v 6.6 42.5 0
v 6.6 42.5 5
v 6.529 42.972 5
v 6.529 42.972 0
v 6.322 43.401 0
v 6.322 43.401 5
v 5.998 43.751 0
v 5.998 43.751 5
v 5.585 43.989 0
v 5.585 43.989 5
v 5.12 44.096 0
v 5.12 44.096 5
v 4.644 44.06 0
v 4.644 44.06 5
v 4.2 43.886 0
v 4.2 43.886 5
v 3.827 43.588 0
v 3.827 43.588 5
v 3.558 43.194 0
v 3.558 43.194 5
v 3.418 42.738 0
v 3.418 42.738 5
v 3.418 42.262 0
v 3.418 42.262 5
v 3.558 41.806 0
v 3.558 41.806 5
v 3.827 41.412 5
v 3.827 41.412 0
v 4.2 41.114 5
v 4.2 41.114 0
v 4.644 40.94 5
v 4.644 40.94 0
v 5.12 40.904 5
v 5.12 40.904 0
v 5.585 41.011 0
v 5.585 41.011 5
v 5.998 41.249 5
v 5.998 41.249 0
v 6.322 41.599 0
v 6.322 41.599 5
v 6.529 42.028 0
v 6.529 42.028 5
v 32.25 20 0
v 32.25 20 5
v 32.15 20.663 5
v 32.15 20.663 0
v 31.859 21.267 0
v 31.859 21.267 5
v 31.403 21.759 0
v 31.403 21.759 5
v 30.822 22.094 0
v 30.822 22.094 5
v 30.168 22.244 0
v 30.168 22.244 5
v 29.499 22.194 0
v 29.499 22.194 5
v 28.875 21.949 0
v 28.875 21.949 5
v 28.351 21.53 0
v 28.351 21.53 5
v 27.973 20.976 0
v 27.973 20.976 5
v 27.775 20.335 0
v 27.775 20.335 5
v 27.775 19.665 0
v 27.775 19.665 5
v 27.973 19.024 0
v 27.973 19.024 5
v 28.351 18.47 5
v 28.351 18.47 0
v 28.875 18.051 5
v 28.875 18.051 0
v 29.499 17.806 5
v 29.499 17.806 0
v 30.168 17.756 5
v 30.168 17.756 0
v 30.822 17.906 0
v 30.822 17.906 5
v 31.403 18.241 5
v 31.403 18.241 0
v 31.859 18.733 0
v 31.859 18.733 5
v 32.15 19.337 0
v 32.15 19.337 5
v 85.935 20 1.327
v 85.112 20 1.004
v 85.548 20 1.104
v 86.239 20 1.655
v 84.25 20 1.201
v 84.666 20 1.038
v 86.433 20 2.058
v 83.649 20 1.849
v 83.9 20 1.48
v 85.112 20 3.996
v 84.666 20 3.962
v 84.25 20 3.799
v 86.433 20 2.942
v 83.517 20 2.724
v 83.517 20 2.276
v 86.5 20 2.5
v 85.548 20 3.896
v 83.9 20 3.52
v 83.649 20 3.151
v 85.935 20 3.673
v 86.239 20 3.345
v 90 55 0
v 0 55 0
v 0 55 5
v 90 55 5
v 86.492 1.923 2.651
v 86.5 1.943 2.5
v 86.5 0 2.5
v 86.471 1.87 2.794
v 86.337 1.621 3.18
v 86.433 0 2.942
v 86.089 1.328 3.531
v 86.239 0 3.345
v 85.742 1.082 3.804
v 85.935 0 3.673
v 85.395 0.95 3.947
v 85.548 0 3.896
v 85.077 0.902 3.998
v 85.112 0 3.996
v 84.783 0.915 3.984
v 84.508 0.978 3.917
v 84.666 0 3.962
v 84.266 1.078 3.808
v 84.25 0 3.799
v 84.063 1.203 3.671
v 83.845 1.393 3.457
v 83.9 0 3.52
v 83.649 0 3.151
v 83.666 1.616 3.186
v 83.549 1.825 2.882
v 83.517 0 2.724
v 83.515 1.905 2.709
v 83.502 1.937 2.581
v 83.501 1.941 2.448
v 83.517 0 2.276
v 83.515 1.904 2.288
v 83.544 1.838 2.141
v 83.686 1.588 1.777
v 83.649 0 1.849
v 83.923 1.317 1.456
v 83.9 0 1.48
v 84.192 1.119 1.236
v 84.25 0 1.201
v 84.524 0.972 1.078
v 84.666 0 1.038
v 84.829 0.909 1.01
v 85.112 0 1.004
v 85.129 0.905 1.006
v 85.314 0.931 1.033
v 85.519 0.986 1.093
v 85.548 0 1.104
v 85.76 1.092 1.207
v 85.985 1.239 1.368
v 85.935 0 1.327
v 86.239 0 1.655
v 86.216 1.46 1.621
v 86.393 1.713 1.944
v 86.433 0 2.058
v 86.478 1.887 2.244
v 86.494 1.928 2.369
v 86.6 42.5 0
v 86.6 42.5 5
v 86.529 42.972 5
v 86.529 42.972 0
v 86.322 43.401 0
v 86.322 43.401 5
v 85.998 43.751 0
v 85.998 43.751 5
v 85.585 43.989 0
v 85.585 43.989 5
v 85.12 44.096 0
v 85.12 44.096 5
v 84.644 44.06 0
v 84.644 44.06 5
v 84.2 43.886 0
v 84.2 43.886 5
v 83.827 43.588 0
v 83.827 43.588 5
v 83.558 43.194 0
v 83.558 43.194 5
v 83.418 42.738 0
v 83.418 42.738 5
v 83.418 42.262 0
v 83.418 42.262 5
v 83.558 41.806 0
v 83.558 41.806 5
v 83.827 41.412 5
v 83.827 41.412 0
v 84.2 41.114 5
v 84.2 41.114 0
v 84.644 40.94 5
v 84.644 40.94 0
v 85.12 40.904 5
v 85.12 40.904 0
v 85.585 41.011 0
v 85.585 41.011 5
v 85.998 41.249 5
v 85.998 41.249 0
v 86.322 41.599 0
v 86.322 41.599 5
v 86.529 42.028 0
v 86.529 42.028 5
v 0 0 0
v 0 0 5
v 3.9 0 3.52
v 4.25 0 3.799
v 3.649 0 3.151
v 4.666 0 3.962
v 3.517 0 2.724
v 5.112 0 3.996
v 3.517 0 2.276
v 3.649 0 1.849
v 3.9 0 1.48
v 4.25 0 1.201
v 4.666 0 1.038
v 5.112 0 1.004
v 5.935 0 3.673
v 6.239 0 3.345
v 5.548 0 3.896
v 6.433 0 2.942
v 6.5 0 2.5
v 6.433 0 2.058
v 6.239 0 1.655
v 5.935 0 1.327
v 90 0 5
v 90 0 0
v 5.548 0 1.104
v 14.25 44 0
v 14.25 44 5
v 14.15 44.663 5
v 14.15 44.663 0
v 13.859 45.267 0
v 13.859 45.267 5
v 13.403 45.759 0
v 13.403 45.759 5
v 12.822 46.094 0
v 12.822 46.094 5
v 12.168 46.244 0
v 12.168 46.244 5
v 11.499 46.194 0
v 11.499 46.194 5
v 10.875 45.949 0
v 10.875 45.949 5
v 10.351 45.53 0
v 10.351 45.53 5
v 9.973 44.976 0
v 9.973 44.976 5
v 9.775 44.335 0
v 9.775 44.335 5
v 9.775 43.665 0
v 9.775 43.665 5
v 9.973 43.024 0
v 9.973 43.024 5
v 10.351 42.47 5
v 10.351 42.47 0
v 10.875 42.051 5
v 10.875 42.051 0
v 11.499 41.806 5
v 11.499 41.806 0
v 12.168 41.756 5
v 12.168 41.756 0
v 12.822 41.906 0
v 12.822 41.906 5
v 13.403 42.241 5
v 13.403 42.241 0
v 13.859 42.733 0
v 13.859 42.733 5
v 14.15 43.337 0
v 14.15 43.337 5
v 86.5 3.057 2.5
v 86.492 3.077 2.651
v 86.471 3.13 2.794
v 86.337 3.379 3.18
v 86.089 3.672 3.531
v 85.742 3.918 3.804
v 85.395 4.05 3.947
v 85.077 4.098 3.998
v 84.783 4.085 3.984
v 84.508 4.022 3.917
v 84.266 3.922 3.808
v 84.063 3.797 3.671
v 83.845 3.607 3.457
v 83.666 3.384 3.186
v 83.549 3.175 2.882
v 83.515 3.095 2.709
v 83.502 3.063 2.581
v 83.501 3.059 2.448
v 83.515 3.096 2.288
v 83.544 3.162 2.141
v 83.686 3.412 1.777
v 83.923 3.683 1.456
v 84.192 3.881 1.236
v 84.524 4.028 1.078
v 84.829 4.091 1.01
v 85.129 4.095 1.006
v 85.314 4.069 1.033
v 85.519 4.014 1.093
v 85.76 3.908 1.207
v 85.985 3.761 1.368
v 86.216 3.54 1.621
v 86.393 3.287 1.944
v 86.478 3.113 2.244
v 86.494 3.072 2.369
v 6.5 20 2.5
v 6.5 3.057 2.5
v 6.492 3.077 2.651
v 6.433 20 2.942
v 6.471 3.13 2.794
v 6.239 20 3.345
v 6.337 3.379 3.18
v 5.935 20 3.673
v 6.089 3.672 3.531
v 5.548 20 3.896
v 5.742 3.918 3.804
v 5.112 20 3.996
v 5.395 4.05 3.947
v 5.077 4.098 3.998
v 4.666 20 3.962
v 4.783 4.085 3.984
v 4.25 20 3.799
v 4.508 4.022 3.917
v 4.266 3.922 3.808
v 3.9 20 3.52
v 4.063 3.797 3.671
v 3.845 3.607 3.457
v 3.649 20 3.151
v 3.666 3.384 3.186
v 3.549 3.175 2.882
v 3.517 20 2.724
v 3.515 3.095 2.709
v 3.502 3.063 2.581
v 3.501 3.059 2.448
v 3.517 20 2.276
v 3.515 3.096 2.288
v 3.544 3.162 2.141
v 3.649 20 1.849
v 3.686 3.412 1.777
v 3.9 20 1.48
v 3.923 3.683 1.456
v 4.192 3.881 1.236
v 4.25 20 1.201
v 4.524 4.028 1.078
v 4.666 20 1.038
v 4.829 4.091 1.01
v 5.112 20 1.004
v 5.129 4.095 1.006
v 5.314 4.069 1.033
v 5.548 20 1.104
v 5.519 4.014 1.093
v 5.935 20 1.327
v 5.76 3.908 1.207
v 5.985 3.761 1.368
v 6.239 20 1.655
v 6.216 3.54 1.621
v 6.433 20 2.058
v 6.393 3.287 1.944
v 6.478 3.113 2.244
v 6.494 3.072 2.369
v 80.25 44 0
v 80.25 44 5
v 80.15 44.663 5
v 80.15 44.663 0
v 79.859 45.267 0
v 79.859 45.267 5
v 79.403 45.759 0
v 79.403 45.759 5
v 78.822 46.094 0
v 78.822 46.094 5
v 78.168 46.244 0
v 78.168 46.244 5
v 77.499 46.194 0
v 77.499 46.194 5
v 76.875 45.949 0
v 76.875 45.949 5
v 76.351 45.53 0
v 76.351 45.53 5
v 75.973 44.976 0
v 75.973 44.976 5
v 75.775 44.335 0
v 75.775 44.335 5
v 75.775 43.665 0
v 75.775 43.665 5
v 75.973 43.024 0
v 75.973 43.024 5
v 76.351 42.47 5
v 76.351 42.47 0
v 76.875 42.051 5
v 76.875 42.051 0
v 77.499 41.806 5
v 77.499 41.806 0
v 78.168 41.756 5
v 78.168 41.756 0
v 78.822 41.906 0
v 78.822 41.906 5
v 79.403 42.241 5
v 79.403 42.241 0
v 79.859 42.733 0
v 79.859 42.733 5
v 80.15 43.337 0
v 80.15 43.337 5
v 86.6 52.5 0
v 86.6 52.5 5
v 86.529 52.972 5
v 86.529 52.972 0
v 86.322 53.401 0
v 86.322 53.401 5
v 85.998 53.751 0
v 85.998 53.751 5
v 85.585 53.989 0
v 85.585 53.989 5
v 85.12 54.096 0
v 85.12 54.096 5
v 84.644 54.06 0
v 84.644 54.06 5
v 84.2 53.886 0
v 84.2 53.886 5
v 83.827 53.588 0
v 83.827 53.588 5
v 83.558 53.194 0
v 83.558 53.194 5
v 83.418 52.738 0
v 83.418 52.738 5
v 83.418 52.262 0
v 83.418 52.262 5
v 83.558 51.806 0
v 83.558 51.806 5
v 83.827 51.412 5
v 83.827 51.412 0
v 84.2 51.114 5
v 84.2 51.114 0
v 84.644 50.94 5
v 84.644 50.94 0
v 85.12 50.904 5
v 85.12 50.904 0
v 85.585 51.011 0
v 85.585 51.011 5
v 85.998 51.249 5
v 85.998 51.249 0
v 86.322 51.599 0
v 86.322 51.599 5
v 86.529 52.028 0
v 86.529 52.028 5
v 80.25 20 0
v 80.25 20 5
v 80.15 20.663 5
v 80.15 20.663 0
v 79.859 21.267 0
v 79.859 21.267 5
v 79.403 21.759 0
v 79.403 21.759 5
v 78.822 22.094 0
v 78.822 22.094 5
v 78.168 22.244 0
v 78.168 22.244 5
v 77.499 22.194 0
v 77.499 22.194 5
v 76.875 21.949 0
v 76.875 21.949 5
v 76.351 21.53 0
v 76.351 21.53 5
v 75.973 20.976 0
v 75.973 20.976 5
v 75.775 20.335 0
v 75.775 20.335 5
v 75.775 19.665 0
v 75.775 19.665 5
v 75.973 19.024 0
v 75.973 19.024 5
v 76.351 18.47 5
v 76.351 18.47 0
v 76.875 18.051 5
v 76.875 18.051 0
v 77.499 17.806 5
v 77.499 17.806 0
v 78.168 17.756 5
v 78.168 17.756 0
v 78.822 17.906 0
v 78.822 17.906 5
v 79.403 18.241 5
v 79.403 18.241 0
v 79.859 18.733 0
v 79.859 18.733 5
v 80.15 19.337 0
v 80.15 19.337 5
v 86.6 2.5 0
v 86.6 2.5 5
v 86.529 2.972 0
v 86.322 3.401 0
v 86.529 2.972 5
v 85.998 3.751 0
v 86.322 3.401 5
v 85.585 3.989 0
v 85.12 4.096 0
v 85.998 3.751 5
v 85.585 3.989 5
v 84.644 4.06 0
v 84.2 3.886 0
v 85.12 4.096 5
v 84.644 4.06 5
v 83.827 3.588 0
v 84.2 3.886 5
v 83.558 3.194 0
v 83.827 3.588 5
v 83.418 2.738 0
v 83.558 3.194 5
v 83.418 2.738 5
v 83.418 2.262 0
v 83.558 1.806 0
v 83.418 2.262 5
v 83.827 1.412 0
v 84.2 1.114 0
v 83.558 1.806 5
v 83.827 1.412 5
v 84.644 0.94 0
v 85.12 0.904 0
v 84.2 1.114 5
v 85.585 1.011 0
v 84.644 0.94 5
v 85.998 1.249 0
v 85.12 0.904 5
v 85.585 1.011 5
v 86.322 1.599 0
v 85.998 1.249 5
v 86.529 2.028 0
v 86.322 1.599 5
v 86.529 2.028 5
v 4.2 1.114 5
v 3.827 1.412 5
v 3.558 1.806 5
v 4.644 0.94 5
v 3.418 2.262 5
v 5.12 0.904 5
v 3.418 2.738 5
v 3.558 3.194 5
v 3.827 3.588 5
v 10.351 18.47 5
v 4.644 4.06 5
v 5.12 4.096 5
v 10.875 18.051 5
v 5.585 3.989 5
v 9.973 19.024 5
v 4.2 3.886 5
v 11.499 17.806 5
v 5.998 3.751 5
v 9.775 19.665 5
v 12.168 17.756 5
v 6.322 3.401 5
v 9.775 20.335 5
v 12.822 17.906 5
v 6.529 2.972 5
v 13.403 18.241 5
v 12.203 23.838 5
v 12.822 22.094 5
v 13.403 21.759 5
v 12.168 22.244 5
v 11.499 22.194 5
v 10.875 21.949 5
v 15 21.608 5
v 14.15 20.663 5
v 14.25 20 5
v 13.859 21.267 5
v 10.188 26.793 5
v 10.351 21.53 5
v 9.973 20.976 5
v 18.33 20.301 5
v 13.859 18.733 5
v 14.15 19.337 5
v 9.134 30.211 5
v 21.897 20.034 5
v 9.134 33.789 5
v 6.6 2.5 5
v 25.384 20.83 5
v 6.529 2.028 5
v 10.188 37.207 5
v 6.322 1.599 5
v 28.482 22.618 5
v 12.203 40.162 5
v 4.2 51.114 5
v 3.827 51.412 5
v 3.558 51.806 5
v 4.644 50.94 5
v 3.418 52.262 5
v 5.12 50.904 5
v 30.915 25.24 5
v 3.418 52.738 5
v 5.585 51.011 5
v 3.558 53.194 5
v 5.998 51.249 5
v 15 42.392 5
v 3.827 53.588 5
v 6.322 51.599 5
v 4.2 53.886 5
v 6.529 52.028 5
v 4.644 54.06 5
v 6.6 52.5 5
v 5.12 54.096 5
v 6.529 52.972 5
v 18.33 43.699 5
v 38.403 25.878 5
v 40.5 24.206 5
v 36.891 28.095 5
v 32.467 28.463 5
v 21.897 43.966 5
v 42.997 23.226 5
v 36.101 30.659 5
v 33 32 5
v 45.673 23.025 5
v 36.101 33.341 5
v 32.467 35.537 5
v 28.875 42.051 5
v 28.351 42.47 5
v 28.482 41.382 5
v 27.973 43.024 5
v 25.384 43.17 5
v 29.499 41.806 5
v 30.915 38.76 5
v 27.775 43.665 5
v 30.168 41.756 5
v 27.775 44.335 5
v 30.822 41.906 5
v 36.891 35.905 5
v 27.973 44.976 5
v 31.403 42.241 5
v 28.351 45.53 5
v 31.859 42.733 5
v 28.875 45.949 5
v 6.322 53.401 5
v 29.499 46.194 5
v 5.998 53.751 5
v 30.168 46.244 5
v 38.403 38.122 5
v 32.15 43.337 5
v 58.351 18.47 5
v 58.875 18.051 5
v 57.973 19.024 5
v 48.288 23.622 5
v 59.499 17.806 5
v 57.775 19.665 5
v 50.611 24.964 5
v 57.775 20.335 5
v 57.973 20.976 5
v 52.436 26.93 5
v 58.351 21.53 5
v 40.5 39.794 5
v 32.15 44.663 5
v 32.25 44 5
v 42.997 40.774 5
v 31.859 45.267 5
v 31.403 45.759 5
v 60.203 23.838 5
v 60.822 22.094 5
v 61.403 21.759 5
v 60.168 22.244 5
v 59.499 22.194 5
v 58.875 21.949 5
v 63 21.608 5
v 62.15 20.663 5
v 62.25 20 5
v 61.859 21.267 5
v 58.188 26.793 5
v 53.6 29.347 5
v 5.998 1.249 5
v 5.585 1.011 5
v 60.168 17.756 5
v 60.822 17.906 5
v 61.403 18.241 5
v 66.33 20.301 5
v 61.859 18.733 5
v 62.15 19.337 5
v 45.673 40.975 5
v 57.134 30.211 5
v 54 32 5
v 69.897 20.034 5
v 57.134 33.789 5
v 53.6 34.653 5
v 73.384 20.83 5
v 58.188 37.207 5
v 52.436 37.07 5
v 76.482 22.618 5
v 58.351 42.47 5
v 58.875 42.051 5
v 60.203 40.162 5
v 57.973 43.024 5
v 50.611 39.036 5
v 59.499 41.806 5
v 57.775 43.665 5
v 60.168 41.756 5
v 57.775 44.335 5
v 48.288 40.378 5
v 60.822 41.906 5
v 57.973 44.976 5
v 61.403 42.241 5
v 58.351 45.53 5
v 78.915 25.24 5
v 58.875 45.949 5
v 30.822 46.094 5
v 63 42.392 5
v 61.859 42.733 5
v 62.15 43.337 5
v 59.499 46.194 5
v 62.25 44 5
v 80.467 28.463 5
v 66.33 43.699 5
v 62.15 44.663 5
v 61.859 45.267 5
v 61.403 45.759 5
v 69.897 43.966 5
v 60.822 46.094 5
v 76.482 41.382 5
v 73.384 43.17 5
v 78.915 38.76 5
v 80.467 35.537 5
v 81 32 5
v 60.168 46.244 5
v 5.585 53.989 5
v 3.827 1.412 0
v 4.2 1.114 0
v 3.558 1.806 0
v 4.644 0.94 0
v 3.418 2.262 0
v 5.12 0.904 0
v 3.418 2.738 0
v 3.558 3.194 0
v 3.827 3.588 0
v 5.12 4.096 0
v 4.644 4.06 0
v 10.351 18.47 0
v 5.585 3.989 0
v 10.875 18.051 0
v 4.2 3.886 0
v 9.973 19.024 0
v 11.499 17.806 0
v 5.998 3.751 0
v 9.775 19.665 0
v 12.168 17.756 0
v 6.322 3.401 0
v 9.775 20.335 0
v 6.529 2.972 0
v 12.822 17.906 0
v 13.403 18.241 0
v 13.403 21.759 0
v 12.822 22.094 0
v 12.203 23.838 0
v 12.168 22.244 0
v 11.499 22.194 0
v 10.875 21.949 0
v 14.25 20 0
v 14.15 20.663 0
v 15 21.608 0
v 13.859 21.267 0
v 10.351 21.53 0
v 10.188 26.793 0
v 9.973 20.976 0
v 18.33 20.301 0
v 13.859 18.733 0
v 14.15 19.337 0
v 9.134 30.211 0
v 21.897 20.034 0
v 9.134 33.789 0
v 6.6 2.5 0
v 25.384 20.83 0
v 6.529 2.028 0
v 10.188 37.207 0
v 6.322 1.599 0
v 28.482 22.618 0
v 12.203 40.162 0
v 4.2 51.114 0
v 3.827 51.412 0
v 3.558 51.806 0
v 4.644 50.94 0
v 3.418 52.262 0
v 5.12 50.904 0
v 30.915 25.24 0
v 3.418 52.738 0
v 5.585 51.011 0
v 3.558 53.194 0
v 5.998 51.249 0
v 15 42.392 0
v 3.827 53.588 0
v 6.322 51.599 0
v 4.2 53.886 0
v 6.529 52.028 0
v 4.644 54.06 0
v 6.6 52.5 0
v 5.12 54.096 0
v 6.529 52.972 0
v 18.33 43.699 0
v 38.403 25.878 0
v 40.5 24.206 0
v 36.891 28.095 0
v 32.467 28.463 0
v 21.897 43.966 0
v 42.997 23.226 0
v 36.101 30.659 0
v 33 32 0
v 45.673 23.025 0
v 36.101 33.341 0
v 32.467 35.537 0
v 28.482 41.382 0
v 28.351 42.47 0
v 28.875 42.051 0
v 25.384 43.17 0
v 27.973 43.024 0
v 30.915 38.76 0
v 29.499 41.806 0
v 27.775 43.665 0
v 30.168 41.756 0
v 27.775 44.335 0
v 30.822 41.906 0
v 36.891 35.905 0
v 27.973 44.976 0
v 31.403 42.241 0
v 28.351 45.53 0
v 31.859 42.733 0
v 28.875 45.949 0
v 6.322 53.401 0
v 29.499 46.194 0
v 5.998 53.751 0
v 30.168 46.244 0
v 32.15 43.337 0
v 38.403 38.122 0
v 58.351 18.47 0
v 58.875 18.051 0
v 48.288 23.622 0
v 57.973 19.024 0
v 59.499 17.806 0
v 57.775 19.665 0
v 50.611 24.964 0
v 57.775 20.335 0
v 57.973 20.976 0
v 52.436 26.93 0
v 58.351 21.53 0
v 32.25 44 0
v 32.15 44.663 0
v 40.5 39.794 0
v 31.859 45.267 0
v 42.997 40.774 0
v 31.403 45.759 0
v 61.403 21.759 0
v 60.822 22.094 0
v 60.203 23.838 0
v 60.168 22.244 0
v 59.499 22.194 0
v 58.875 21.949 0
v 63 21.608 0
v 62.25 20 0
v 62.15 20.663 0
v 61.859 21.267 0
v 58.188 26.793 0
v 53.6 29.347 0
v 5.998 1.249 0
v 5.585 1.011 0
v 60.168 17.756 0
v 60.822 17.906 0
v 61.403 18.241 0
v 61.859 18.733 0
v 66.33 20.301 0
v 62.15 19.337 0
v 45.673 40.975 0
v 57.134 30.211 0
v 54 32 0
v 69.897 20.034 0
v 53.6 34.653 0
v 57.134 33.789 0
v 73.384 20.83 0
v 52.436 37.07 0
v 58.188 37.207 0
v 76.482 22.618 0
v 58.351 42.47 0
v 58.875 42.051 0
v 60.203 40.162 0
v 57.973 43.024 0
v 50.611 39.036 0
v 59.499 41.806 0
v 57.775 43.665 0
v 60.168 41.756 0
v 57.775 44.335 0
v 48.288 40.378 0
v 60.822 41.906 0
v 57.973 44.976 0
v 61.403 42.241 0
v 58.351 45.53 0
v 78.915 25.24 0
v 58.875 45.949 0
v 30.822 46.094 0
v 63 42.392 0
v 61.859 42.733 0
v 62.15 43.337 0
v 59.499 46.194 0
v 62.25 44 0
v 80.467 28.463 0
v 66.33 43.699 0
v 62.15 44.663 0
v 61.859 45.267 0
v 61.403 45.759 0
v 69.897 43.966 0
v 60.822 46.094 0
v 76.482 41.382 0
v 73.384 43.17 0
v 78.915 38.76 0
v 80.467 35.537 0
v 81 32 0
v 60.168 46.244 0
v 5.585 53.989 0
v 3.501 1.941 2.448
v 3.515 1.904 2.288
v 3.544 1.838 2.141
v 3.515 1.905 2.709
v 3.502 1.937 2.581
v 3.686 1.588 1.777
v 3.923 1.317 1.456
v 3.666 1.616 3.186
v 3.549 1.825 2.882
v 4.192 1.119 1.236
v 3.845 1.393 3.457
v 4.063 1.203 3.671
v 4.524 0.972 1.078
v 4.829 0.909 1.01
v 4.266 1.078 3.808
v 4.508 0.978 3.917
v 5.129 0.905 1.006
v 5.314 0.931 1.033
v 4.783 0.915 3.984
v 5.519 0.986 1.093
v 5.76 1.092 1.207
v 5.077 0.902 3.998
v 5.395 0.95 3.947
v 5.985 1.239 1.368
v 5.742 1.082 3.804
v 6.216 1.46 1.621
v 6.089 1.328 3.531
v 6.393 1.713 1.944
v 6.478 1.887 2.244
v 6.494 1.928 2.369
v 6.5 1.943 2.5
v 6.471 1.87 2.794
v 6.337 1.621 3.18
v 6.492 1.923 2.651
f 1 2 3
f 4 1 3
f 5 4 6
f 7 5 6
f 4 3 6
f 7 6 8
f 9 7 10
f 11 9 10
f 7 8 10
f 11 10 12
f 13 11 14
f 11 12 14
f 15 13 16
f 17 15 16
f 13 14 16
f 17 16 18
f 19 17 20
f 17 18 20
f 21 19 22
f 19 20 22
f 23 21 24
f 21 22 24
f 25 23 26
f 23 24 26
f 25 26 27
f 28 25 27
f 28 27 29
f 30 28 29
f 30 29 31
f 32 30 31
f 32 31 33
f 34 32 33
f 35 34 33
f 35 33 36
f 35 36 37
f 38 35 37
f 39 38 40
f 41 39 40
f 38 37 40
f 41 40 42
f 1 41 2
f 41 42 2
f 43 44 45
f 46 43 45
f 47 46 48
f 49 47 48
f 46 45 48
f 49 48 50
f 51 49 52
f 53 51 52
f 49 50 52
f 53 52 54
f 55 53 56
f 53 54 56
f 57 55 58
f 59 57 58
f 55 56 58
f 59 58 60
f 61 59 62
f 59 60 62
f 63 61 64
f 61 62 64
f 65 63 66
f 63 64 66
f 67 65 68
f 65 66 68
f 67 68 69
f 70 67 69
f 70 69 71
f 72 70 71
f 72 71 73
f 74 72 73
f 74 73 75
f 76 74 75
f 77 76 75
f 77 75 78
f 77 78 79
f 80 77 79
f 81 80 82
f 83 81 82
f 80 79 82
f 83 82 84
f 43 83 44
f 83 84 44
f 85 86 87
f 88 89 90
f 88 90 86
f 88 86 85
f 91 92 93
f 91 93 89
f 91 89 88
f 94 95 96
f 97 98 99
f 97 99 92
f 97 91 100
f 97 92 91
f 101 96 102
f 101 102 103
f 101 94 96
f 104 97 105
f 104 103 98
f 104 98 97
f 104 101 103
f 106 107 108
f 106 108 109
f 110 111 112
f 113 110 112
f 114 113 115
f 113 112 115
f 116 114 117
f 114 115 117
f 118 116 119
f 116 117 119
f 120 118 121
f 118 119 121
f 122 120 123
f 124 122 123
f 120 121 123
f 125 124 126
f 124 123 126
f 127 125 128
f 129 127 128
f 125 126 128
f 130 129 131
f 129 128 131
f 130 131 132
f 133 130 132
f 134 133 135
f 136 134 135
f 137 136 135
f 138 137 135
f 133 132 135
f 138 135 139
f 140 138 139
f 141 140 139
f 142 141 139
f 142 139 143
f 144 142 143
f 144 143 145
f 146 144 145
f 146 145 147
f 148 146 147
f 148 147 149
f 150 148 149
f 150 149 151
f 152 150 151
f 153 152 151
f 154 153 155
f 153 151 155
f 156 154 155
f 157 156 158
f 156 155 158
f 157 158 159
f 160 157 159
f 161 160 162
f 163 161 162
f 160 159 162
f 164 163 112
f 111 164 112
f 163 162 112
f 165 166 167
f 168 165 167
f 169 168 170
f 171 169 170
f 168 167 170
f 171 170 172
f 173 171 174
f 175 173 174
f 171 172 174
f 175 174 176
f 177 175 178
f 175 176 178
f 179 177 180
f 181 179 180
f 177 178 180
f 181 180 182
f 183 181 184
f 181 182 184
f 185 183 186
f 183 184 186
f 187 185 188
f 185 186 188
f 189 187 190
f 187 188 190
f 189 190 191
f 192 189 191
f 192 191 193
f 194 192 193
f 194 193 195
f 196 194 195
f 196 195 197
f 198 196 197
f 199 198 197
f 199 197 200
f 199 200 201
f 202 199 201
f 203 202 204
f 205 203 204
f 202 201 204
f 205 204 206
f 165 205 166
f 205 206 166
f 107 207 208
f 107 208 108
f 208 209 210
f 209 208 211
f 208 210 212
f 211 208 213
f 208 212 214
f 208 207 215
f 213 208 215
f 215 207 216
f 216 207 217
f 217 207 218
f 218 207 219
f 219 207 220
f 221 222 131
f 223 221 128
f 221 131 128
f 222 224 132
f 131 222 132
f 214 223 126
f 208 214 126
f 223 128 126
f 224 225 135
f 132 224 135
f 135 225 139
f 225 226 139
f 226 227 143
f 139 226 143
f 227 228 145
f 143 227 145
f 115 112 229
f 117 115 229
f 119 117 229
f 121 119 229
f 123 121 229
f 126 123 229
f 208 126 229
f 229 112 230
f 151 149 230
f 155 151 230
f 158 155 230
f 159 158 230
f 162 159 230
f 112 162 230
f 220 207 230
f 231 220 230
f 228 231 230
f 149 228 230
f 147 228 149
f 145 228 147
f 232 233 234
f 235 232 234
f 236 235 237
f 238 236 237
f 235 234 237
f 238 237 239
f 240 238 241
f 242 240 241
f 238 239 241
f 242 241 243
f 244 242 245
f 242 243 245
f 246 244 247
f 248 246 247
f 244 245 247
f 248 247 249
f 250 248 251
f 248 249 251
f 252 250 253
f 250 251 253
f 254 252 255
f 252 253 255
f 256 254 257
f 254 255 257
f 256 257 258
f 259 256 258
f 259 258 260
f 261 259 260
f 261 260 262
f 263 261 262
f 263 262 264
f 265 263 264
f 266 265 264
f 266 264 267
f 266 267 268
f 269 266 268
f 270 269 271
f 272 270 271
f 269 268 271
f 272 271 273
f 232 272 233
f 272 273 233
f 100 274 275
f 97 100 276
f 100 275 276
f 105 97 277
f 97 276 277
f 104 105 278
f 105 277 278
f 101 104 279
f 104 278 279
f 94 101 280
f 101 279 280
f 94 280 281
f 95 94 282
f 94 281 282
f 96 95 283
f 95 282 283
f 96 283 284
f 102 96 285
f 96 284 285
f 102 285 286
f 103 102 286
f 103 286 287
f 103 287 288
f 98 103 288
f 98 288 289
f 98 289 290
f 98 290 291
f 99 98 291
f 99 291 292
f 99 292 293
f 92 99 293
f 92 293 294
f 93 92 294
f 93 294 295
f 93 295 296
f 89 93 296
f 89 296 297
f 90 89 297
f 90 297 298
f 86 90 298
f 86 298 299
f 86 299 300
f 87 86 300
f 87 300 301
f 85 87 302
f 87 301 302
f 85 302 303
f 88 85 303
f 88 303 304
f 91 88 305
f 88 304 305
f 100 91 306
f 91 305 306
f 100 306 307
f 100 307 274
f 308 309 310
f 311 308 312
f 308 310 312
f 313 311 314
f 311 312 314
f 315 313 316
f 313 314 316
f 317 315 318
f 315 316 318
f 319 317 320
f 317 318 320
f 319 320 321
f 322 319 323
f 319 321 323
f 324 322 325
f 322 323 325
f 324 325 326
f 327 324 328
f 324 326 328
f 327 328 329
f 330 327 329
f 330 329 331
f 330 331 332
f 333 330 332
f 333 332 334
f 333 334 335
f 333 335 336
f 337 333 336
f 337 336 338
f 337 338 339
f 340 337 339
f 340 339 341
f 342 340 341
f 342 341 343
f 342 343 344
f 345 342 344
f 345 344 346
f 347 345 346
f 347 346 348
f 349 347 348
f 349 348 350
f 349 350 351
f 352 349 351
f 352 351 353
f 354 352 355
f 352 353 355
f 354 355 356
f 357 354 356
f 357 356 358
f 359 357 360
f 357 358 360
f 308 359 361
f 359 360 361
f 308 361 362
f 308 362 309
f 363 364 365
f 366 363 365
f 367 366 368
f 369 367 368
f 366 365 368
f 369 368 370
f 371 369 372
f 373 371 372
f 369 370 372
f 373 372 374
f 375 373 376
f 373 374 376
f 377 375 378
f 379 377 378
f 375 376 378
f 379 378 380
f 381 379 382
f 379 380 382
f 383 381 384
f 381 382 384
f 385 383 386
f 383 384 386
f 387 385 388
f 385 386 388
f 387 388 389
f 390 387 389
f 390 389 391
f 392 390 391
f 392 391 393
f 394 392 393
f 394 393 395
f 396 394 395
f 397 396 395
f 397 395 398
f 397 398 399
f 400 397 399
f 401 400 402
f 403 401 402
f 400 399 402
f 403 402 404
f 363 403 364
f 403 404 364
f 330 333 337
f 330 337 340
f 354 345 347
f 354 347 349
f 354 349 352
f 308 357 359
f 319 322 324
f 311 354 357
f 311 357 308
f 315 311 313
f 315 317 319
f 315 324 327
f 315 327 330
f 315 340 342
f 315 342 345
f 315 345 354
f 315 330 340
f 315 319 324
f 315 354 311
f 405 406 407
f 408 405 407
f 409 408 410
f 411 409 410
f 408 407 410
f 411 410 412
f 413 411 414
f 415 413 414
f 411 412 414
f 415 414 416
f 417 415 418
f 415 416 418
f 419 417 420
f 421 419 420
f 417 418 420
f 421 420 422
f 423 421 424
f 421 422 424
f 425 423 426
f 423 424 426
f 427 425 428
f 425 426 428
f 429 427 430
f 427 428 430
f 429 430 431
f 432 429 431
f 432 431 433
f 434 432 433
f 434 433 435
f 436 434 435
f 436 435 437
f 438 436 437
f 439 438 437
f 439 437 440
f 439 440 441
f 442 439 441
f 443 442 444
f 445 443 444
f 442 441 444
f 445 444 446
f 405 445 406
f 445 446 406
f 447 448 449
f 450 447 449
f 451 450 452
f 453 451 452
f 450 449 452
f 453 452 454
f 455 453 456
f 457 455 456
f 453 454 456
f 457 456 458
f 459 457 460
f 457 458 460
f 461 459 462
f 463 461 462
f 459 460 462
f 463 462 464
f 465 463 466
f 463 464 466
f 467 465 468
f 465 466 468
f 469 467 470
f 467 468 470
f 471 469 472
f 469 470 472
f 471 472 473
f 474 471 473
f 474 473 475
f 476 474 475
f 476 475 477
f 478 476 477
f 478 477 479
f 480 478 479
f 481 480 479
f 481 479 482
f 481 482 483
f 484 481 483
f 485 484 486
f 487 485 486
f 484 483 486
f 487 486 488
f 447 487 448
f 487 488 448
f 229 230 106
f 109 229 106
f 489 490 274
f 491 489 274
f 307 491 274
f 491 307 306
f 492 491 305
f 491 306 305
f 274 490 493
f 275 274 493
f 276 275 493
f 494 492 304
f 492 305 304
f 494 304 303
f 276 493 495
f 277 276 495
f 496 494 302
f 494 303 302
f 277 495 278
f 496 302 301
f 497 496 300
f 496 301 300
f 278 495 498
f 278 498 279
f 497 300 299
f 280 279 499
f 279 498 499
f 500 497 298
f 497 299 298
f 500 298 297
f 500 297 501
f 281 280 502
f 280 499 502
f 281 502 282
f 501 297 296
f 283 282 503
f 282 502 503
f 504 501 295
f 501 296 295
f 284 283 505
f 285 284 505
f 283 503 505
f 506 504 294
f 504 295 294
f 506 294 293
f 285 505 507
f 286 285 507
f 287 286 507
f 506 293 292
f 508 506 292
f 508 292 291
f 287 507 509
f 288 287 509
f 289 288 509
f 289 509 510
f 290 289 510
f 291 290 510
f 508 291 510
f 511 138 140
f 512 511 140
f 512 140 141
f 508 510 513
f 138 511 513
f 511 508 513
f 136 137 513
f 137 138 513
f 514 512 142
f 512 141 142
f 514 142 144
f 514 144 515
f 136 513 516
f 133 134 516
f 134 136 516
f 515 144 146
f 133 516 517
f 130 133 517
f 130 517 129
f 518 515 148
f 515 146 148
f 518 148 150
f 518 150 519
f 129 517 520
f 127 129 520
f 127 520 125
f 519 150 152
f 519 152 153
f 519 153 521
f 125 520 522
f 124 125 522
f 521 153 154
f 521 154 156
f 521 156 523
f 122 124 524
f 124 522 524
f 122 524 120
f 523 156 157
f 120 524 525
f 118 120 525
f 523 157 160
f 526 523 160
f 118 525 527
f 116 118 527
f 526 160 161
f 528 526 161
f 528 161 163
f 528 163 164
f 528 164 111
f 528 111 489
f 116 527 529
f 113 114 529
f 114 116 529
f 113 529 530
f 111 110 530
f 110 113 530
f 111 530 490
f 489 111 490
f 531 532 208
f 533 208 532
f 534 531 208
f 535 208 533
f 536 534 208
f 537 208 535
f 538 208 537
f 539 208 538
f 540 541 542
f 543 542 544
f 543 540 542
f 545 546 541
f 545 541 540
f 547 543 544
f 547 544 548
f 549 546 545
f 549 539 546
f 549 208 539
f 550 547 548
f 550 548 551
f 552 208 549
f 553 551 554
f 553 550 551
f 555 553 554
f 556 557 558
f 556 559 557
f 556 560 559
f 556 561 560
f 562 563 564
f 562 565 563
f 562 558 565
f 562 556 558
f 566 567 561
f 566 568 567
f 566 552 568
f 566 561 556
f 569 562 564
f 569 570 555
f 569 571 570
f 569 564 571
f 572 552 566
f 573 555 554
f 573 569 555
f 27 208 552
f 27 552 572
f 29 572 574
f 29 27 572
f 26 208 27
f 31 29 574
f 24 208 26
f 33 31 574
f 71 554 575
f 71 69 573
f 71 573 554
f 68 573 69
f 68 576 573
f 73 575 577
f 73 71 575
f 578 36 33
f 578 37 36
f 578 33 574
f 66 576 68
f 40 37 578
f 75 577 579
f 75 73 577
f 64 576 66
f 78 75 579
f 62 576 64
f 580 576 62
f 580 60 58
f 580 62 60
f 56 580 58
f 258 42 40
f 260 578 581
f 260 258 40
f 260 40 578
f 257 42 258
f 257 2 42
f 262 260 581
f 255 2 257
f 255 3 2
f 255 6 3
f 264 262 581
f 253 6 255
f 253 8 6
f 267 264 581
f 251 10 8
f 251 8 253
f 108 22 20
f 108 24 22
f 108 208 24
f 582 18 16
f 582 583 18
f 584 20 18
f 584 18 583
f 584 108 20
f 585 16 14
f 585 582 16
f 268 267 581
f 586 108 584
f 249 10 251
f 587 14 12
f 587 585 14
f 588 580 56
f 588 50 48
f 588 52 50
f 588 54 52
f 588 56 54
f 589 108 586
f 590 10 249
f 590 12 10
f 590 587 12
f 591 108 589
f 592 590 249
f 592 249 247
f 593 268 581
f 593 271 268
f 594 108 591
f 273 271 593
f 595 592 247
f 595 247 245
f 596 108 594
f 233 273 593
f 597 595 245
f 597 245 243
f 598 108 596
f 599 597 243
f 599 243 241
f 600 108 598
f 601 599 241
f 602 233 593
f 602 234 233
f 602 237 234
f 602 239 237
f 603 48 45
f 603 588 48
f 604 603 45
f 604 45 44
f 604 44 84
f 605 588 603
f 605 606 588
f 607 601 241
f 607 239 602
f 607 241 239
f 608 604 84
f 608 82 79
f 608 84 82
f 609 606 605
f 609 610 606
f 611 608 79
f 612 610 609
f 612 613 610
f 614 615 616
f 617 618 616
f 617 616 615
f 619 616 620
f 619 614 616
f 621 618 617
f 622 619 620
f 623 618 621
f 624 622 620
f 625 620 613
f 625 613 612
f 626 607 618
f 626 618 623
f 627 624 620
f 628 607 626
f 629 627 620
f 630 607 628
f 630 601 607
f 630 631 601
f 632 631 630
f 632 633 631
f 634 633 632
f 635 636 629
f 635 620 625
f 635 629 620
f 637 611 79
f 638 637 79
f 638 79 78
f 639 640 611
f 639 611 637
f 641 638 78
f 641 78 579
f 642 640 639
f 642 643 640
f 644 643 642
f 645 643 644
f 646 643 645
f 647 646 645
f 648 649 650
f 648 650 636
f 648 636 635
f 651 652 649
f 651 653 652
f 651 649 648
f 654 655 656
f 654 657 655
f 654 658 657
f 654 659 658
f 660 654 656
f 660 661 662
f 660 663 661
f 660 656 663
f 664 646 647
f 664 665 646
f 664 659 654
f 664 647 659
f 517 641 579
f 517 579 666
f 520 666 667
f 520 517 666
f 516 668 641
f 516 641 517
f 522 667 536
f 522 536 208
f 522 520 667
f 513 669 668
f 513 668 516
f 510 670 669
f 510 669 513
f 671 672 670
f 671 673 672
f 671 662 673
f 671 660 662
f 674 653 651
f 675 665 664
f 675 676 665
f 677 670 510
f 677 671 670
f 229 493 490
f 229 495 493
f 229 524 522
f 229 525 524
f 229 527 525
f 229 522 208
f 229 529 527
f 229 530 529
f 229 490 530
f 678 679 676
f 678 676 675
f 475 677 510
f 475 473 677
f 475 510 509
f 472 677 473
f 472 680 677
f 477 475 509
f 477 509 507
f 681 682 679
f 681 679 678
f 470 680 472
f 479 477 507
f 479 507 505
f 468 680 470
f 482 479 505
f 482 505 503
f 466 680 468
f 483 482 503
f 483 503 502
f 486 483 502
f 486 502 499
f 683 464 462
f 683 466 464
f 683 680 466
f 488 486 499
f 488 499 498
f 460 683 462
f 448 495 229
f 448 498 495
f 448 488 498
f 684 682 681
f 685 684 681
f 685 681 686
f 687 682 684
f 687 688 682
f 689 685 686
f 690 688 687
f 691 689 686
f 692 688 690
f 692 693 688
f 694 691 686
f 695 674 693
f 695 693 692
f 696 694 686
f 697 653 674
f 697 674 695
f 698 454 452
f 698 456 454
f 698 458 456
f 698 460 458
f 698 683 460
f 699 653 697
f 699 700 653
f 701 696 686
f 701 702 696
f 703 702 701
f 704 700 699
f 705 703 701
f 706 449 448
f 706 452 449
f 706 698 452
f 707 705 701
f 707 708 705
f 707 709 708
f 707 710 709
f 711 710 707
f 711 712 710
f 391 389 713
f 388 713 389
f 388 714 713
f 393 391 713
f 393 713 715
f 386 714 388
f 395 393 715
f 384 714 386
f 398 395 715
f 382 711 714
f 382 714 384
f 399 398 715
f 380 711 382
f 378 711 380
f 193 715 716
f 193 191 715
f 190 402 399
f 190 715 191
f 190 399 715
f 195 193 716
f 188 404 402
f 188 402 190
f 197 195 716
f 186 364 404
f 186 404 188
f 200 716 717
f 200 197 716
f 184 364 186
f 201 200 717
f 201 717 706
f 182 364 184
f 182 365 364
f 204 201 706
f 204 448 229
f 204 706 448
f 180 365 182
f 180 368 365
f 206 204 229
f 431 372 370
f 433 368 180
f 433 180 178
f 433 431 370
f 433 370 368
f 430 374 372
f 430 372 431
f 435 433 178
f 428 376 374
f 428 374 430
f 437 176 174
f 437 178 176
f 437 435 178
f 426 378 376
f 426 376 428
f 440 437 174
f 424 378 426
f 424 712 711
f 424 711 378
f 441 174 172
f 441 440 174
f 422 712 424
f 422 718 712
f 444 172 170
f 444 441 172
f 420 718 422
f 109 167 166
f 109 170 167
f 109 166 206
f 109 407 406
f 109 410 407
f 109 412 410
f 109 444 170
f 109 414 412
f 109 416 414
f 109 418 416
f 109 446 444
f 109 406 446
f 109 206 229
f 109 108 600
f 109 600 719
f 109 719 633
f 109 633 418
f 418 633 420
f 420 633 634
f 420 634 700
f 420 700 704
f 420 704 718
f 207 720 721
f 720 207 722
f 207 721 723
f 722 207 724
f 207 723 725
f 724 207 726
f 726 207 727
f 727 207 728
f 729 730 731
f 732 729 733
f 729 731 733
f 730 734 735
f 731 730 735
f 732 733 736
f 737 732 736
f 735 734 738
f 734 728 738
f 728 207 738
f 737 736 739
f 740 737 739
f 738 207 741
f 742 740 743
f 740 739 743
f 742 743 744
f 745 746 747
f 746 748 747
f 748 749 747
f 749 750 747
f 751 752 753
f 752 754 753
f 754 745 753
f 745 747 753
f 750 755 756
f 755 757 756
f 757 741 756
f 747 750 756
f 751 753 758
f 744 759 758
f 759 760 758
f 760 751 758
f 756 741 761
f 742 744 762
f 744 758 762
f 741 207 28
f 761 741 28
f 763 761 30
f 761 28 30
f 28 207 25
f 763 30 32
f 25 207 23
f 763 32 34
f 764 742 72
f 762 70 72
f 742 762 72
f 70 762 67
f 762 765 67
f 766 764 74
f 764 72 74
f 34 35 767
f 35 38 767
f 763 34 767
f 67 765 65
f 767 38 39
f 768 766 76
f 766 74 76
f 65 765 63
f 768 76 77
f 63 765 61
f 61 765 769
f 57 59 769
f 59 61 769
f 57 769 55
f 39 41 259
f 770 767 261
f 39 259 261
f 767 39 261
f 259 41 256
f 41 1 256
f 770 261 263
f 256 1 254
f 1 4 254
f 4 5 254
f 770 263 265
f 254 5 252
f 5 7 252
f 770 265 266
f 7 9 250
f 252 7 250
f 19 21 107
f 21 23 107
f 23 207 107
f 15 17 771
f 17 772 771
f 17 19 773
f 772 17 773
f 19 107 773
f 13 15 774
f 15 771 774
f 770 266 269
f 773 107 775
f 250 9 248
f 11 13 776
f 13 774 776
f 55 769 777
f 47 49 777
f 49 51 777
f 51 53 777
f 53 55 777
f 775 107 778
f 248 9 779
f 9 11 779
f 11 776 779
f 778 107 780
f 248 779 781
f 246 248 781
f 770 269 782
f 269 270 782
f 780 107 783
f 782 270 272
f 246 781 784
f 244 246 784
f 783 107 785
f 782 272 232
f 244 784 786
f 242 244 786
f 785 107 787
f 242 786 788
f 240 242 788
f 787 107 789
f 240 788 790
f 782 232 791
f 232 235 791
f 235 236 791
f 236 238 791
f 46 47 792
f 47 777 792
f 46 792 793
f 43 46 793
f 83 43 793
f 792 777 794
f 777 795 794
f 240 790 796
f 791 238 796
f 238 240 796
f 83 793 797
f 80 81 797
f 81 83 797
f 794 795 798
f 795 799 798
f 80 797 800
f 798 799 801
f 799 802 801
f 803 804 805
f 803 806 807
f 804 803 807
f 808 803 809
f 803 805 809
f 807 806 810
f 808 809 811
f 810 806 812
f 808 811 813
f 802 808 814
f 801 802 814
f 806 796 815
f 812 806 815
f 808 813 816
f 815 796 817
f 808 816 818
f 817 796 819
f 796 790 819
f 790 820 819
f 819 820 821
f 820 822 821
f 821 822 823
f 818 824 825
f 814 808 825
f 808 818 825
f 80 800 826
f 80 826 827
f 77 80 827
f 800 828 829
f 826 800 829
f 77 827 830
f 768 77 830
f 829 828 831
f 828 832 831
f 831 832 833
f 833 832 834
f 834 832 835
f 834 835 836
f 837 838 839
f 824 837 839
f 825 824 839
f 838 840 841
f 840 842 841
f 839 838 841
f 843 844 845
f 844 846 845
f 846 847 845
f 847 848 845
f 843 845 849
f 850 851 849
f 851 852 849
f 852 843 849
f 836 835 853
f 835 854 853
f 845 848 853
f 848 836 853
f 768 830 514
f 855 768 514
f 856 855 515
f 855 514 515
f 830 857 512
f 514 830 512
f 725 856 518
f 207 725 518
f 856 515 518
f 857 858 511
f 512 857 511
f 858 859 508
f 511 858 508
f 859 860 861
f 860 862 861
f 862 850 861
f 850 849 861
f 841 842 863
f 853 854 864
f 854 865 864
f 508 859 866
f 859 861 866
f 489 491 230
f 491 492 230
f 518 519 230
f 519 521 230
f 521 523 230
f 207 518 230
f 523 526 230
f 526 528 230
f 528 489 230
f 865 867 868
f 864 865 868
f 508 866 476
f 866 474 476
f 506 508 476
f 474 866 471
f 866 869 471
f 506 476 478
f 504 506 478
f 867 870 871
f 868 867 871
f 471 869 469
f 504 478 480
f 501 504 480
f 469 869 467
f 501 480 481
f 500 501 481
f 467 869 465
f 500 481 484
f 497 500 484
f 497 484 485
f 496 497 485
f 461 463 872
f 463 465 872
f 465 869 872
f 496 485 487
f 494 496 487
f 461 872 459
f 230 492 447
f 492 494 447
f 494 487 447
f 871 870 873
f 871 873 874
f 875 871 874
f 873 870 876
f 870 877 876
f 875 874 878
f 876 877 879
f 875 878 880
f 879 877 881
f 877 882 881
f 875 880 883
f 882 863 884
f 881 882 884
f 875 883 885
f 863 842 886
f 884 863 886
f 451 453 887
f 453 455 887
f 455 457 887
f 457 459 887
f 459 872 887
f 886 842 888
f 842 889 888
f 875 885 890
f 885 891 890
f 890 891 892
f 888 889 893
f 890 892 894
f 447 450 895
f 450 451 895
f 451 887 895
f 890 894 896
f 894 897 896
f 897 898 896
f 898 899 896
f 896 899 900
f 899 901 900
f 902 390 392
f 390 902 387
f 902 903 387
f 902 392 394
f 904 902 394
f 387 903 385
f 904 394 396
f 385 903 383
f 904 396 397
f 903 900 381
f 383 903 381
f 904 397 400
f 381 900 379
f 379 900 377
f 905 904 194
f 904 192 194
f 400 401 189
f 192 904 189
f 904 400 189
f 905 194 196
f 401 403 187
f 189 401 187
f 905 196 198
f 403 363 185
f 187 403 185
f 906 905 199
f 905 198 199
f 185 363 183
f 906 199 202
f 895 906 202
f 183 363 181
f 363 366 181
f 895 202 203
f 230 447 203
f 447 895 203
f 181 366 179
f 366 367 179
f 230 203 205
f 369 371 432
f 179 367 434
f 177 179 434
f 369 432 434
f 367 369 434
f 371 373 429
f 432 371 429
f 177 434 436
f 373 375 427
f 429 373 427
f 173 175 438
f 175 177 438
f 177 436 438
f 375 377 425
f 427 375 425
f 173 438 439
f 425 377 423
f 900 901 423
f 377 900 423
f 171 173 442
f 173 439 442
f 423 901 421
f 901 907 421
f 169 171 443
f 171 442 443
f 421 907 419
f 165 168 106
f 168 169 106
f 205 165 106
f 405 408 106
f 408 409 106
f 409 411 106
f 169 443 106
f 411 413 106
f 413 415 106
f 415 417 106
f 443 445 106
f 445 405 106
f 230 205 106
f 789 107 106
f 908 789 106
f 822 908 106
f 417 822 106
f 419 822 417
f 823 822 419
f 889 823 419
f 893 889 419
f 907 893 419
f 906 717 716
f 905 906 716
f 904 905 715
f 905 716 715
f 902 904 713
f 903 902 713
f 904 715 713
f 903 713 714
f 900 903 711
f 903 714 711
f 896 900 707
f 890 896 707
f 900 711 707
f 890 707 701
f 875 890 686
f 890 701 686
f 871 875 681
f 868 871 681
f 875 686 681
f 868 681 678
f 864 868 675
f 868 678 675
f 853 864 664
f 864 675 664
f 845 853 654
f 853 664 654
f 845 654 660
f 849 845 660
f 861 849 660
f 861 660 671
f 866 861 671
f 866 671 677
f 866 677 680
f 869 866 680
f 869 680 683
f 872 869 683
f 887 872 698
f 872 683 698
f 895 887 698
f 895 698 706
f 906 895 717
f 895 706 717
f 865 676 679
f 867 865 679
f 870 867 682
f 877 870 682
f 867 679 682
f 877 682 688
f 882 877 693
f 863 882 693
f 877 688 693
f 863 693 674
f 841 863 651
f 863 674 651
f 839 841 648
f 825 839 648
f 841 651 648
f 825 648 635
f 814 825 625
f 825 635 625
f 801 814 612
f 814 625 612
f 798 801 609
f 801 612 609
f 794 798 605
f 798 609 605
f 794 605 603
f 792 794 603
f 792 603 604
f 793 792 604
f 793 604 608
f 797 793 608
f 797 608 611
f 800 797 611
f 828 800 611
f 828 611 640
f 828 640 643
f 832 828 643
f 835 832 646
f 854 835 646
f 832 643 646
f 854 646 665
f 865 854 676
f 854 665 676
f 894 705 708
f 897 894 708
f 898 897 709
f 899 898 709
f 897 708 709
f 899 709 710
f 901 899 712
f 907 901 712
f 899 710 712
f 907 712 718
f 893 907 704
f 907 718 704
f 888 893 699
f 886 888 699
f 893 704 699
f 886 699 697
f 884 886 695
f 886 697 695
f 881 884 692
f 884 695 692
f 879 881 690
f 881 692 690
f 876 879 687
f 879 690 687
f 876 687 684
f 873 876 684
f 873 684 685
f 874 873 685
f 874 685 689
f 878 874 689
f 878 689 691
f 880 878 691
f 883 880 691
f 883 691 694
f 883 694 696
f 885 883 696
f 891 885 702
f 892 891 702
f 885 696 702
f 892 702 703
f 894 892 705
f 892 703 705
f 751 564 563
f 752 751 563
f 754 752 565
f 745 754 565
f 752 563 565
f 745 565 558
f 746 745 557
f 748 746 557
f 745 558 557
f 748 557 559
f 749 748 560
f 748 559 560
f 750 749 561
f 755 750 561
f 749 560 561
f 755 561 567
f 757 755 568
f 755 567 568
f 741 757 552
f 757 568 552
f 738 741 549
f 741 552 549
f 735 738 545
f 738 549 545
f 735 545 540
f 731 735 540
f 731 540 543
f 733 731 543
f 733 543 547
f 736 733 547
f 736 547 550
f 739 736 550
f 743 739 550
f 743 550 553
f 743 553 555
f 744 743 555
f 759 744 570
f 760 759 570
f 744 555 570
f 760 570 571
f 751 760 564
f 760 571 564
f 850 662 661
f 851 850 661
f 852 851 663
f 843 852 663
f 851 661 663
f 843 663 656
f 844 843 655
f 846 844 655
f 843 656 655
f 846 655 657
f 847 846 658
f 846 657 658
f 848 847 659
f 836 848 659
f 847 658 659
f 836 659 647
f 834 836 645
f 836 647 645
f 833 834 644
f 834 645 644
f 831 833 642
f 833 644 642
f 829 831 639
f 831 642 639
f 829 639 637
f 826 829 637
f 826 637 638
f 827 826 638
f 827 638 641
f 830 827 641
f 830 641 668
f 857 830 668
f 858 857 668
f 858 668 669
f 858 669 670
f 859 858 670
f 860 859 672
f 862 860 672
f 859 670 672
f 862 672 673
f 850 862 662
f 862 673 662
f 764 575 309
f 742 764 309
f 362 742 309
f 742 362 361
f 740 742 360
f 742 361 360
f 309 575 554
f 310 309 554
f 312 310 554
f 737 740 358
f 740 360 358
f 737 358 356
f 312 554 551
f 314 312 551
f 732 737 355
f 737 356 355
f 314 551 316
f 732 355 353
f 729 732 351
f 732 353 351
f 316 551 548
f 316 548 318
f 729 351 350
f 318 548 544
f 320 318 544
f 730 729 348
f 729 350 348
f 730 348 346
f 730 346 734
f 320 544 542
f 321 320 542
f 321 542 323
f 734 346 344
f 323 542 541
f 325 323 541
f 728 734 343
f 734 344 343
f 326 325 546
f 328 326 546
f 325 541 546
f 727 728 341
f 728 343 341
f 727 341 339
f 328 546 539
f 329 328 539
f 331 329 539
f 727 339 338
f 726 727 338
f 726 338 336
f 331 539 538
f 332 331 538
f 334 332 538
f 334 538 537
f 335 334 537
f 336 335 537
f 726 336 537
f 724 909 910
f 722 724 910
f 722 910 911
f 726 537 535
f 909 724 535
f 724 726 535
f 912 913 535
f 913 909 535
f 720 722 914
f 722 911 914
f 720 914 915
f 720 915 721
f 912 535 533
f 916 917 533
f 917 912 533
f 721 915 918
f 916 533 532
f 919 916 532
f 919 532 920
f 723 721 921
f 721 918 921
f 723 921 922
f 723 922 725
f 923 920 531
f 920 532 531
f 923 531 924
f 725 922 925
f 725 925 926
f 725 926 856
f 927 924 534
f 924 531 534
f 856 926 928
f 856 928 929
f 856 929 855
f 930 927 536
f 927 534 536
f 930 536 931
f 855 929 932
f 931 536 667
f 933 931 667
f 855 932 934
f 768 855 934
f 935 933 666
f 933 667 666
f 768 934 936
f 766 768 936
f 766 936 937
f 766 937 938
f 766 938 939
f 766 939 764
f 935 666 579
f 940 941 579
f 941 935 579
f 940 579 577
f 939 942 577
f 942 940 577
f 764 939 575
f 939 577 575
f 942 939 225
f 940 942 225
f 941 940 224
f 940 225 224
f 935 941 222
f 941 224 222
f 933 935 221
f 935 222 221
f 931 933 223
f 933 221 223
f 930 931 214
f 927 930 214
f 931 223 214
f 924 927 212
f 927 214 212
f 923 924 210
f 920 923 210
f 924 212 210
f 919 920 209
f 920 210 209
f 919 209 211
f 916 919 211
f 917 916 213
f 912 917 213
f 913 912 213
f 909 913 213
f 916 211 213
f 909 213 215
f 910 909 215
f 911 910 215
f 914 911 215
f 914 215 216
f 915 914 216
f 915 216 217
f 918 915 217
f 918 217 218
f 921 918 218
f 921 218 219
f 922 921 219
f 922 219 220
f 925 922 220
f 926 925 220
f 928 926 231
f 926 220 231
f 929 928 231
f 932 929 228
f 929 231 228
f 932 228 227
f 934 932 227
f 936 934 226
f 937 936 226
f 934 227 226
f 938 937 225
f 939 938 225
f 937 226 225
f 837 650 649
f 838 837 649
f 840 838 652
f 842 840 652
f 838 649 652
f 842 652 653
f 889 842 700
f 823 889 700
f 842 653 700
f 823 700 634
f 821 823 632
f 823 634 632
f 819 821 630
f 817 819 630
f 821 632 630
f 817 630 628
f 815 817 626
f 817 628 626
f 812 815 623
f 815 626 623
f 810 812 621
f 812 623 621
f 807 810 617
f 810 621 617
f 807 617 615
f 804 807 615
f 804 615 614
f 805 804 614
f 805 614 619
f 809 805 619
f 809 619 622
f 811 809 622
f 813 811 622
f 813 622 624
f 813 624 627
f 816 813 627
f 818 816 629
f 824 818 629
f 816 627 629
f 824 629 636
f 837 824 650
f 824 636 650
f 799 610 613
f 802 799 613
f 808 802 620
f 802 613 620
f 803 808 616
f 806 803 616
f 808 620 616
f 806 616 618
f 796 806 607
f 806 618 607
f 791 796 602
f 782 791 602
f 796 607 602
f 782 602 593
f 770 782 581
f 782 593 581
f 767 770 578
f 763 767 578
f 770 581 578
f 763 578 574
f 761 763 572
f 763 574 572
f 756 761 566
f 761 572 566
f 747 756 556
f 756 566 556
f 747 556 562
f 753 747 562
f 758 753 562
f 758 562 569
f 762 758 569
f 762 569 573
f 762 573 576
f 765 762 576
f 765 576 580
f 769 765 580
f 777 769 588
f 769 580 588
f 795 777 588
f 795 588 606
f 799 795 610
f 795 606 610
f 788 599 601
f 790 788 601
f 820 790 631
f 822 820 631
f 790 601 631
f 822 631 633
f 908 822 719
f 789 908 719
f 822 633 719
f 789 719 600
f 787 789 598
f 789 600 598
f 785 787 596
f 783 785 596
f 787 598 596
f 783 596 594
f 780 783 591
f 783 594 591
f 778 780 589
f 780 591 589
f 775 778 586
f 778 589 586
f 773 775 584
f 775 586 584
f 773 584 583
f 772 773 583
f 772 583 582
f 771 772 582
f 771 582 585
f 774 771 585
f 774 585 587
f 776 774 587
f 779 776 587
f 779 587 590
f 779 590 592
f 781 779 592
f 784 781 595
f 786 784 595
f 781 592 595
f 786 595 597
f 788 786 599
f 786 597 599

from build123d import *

# Parameters (mm, degrees)
SKETCH_W        = 90
SKETCH_H        = 55
PAD_DEPTH       = 5
SKETCH001_R     = 9
SKETCH001_R_2   = 12
SKETCH001_R_3   = 2.25
POCKET_DEPTH    = 5
SKETCH002_R     = 1.6
POCKET001_DEPTH = 5
SKETCH003_R     = 1.5
POCKET002_DEPTH = 20


with BuildPart() as part:
    # Sketch → Pad (new body)
    with BuildSketch(Plane.XY):
        with Locations((45, 27.5)):
            Rectangle(SKETCH_W, SKETCH_H)
    extrude(amount=PAD_DEPTH)

    # Sketch001 (on Face6 of Pad) → Pocket (cut)
    with BuildSketch(Plane.XY.offset(5)):
        with Locations((45, 32)):
            Circle(SKETCH001_R)
        with Locations((21, 32)):
            Circle(SKETCH001_R_2)
        with Locations((69, 32)):
            Circle(SKETCH001_R_2)
        with Locations((12, 44)):
            Circle(SKETCH001_R_3)
        with Locations((30, 44)):
            Circle(SKETCH001_R_3)
        with Locations((30, 20)):
            Circle(SKETCH001_R_3)
        with Locations((12, 20)):
            Circle(SKETCH001_R_3)
        with Locations((60, 44)):
            Circle(SKETCH001_R_3)
        with Locations((78, 44)):
            Circle(SKETCH001_R_3)
        with Locations((78, 20)):
            Circle(SKETCH001_R_3)
        with Locations((60, 20)):
            Circle(SKETCH001_R_3)
    extrude(amount=-POCKET_DEPTH, mode=Mode.SUBTRACT)

    # Sketch002 (on Face5 of Pocket) → Pocket001 (cut)
    with BuildSketch(Plane.XY.offset(5)):
        with Locations((5, 52.5)):
            Circle(SKETCH002_R)
        with Locations((5, 2.5)):
            Circle(SKETCH002_R)
        with Locations((85, 2.5)):
            Circle(SKETCH002_R)
        with Locations((85, 52.5)):
            Circle(SKETCH002_R)
        with Locations((5, 42.5)):
            Circle(SKETCH002_R)
        with Locations((85, 42.5)):
            Circle(SKETCH002_R)
    extrude(amount=-POCKET001_DEPTH, mode=Mode.SUBTRACT)

    # Sketch003 (on Face1 of Pocket001) → Pocket002 (cut)
    with BuildSketch(Plane.XZ):
        with Locations((85, 2.5)):
            Circle(SKETCH003_R)
        with Locations((5, 2.5)):
            Circle(SKETCH003_R)
    extrude(amount=-POCKET002_DEPTH, mode=Mode.SUBTRACT)


solid = part.part
